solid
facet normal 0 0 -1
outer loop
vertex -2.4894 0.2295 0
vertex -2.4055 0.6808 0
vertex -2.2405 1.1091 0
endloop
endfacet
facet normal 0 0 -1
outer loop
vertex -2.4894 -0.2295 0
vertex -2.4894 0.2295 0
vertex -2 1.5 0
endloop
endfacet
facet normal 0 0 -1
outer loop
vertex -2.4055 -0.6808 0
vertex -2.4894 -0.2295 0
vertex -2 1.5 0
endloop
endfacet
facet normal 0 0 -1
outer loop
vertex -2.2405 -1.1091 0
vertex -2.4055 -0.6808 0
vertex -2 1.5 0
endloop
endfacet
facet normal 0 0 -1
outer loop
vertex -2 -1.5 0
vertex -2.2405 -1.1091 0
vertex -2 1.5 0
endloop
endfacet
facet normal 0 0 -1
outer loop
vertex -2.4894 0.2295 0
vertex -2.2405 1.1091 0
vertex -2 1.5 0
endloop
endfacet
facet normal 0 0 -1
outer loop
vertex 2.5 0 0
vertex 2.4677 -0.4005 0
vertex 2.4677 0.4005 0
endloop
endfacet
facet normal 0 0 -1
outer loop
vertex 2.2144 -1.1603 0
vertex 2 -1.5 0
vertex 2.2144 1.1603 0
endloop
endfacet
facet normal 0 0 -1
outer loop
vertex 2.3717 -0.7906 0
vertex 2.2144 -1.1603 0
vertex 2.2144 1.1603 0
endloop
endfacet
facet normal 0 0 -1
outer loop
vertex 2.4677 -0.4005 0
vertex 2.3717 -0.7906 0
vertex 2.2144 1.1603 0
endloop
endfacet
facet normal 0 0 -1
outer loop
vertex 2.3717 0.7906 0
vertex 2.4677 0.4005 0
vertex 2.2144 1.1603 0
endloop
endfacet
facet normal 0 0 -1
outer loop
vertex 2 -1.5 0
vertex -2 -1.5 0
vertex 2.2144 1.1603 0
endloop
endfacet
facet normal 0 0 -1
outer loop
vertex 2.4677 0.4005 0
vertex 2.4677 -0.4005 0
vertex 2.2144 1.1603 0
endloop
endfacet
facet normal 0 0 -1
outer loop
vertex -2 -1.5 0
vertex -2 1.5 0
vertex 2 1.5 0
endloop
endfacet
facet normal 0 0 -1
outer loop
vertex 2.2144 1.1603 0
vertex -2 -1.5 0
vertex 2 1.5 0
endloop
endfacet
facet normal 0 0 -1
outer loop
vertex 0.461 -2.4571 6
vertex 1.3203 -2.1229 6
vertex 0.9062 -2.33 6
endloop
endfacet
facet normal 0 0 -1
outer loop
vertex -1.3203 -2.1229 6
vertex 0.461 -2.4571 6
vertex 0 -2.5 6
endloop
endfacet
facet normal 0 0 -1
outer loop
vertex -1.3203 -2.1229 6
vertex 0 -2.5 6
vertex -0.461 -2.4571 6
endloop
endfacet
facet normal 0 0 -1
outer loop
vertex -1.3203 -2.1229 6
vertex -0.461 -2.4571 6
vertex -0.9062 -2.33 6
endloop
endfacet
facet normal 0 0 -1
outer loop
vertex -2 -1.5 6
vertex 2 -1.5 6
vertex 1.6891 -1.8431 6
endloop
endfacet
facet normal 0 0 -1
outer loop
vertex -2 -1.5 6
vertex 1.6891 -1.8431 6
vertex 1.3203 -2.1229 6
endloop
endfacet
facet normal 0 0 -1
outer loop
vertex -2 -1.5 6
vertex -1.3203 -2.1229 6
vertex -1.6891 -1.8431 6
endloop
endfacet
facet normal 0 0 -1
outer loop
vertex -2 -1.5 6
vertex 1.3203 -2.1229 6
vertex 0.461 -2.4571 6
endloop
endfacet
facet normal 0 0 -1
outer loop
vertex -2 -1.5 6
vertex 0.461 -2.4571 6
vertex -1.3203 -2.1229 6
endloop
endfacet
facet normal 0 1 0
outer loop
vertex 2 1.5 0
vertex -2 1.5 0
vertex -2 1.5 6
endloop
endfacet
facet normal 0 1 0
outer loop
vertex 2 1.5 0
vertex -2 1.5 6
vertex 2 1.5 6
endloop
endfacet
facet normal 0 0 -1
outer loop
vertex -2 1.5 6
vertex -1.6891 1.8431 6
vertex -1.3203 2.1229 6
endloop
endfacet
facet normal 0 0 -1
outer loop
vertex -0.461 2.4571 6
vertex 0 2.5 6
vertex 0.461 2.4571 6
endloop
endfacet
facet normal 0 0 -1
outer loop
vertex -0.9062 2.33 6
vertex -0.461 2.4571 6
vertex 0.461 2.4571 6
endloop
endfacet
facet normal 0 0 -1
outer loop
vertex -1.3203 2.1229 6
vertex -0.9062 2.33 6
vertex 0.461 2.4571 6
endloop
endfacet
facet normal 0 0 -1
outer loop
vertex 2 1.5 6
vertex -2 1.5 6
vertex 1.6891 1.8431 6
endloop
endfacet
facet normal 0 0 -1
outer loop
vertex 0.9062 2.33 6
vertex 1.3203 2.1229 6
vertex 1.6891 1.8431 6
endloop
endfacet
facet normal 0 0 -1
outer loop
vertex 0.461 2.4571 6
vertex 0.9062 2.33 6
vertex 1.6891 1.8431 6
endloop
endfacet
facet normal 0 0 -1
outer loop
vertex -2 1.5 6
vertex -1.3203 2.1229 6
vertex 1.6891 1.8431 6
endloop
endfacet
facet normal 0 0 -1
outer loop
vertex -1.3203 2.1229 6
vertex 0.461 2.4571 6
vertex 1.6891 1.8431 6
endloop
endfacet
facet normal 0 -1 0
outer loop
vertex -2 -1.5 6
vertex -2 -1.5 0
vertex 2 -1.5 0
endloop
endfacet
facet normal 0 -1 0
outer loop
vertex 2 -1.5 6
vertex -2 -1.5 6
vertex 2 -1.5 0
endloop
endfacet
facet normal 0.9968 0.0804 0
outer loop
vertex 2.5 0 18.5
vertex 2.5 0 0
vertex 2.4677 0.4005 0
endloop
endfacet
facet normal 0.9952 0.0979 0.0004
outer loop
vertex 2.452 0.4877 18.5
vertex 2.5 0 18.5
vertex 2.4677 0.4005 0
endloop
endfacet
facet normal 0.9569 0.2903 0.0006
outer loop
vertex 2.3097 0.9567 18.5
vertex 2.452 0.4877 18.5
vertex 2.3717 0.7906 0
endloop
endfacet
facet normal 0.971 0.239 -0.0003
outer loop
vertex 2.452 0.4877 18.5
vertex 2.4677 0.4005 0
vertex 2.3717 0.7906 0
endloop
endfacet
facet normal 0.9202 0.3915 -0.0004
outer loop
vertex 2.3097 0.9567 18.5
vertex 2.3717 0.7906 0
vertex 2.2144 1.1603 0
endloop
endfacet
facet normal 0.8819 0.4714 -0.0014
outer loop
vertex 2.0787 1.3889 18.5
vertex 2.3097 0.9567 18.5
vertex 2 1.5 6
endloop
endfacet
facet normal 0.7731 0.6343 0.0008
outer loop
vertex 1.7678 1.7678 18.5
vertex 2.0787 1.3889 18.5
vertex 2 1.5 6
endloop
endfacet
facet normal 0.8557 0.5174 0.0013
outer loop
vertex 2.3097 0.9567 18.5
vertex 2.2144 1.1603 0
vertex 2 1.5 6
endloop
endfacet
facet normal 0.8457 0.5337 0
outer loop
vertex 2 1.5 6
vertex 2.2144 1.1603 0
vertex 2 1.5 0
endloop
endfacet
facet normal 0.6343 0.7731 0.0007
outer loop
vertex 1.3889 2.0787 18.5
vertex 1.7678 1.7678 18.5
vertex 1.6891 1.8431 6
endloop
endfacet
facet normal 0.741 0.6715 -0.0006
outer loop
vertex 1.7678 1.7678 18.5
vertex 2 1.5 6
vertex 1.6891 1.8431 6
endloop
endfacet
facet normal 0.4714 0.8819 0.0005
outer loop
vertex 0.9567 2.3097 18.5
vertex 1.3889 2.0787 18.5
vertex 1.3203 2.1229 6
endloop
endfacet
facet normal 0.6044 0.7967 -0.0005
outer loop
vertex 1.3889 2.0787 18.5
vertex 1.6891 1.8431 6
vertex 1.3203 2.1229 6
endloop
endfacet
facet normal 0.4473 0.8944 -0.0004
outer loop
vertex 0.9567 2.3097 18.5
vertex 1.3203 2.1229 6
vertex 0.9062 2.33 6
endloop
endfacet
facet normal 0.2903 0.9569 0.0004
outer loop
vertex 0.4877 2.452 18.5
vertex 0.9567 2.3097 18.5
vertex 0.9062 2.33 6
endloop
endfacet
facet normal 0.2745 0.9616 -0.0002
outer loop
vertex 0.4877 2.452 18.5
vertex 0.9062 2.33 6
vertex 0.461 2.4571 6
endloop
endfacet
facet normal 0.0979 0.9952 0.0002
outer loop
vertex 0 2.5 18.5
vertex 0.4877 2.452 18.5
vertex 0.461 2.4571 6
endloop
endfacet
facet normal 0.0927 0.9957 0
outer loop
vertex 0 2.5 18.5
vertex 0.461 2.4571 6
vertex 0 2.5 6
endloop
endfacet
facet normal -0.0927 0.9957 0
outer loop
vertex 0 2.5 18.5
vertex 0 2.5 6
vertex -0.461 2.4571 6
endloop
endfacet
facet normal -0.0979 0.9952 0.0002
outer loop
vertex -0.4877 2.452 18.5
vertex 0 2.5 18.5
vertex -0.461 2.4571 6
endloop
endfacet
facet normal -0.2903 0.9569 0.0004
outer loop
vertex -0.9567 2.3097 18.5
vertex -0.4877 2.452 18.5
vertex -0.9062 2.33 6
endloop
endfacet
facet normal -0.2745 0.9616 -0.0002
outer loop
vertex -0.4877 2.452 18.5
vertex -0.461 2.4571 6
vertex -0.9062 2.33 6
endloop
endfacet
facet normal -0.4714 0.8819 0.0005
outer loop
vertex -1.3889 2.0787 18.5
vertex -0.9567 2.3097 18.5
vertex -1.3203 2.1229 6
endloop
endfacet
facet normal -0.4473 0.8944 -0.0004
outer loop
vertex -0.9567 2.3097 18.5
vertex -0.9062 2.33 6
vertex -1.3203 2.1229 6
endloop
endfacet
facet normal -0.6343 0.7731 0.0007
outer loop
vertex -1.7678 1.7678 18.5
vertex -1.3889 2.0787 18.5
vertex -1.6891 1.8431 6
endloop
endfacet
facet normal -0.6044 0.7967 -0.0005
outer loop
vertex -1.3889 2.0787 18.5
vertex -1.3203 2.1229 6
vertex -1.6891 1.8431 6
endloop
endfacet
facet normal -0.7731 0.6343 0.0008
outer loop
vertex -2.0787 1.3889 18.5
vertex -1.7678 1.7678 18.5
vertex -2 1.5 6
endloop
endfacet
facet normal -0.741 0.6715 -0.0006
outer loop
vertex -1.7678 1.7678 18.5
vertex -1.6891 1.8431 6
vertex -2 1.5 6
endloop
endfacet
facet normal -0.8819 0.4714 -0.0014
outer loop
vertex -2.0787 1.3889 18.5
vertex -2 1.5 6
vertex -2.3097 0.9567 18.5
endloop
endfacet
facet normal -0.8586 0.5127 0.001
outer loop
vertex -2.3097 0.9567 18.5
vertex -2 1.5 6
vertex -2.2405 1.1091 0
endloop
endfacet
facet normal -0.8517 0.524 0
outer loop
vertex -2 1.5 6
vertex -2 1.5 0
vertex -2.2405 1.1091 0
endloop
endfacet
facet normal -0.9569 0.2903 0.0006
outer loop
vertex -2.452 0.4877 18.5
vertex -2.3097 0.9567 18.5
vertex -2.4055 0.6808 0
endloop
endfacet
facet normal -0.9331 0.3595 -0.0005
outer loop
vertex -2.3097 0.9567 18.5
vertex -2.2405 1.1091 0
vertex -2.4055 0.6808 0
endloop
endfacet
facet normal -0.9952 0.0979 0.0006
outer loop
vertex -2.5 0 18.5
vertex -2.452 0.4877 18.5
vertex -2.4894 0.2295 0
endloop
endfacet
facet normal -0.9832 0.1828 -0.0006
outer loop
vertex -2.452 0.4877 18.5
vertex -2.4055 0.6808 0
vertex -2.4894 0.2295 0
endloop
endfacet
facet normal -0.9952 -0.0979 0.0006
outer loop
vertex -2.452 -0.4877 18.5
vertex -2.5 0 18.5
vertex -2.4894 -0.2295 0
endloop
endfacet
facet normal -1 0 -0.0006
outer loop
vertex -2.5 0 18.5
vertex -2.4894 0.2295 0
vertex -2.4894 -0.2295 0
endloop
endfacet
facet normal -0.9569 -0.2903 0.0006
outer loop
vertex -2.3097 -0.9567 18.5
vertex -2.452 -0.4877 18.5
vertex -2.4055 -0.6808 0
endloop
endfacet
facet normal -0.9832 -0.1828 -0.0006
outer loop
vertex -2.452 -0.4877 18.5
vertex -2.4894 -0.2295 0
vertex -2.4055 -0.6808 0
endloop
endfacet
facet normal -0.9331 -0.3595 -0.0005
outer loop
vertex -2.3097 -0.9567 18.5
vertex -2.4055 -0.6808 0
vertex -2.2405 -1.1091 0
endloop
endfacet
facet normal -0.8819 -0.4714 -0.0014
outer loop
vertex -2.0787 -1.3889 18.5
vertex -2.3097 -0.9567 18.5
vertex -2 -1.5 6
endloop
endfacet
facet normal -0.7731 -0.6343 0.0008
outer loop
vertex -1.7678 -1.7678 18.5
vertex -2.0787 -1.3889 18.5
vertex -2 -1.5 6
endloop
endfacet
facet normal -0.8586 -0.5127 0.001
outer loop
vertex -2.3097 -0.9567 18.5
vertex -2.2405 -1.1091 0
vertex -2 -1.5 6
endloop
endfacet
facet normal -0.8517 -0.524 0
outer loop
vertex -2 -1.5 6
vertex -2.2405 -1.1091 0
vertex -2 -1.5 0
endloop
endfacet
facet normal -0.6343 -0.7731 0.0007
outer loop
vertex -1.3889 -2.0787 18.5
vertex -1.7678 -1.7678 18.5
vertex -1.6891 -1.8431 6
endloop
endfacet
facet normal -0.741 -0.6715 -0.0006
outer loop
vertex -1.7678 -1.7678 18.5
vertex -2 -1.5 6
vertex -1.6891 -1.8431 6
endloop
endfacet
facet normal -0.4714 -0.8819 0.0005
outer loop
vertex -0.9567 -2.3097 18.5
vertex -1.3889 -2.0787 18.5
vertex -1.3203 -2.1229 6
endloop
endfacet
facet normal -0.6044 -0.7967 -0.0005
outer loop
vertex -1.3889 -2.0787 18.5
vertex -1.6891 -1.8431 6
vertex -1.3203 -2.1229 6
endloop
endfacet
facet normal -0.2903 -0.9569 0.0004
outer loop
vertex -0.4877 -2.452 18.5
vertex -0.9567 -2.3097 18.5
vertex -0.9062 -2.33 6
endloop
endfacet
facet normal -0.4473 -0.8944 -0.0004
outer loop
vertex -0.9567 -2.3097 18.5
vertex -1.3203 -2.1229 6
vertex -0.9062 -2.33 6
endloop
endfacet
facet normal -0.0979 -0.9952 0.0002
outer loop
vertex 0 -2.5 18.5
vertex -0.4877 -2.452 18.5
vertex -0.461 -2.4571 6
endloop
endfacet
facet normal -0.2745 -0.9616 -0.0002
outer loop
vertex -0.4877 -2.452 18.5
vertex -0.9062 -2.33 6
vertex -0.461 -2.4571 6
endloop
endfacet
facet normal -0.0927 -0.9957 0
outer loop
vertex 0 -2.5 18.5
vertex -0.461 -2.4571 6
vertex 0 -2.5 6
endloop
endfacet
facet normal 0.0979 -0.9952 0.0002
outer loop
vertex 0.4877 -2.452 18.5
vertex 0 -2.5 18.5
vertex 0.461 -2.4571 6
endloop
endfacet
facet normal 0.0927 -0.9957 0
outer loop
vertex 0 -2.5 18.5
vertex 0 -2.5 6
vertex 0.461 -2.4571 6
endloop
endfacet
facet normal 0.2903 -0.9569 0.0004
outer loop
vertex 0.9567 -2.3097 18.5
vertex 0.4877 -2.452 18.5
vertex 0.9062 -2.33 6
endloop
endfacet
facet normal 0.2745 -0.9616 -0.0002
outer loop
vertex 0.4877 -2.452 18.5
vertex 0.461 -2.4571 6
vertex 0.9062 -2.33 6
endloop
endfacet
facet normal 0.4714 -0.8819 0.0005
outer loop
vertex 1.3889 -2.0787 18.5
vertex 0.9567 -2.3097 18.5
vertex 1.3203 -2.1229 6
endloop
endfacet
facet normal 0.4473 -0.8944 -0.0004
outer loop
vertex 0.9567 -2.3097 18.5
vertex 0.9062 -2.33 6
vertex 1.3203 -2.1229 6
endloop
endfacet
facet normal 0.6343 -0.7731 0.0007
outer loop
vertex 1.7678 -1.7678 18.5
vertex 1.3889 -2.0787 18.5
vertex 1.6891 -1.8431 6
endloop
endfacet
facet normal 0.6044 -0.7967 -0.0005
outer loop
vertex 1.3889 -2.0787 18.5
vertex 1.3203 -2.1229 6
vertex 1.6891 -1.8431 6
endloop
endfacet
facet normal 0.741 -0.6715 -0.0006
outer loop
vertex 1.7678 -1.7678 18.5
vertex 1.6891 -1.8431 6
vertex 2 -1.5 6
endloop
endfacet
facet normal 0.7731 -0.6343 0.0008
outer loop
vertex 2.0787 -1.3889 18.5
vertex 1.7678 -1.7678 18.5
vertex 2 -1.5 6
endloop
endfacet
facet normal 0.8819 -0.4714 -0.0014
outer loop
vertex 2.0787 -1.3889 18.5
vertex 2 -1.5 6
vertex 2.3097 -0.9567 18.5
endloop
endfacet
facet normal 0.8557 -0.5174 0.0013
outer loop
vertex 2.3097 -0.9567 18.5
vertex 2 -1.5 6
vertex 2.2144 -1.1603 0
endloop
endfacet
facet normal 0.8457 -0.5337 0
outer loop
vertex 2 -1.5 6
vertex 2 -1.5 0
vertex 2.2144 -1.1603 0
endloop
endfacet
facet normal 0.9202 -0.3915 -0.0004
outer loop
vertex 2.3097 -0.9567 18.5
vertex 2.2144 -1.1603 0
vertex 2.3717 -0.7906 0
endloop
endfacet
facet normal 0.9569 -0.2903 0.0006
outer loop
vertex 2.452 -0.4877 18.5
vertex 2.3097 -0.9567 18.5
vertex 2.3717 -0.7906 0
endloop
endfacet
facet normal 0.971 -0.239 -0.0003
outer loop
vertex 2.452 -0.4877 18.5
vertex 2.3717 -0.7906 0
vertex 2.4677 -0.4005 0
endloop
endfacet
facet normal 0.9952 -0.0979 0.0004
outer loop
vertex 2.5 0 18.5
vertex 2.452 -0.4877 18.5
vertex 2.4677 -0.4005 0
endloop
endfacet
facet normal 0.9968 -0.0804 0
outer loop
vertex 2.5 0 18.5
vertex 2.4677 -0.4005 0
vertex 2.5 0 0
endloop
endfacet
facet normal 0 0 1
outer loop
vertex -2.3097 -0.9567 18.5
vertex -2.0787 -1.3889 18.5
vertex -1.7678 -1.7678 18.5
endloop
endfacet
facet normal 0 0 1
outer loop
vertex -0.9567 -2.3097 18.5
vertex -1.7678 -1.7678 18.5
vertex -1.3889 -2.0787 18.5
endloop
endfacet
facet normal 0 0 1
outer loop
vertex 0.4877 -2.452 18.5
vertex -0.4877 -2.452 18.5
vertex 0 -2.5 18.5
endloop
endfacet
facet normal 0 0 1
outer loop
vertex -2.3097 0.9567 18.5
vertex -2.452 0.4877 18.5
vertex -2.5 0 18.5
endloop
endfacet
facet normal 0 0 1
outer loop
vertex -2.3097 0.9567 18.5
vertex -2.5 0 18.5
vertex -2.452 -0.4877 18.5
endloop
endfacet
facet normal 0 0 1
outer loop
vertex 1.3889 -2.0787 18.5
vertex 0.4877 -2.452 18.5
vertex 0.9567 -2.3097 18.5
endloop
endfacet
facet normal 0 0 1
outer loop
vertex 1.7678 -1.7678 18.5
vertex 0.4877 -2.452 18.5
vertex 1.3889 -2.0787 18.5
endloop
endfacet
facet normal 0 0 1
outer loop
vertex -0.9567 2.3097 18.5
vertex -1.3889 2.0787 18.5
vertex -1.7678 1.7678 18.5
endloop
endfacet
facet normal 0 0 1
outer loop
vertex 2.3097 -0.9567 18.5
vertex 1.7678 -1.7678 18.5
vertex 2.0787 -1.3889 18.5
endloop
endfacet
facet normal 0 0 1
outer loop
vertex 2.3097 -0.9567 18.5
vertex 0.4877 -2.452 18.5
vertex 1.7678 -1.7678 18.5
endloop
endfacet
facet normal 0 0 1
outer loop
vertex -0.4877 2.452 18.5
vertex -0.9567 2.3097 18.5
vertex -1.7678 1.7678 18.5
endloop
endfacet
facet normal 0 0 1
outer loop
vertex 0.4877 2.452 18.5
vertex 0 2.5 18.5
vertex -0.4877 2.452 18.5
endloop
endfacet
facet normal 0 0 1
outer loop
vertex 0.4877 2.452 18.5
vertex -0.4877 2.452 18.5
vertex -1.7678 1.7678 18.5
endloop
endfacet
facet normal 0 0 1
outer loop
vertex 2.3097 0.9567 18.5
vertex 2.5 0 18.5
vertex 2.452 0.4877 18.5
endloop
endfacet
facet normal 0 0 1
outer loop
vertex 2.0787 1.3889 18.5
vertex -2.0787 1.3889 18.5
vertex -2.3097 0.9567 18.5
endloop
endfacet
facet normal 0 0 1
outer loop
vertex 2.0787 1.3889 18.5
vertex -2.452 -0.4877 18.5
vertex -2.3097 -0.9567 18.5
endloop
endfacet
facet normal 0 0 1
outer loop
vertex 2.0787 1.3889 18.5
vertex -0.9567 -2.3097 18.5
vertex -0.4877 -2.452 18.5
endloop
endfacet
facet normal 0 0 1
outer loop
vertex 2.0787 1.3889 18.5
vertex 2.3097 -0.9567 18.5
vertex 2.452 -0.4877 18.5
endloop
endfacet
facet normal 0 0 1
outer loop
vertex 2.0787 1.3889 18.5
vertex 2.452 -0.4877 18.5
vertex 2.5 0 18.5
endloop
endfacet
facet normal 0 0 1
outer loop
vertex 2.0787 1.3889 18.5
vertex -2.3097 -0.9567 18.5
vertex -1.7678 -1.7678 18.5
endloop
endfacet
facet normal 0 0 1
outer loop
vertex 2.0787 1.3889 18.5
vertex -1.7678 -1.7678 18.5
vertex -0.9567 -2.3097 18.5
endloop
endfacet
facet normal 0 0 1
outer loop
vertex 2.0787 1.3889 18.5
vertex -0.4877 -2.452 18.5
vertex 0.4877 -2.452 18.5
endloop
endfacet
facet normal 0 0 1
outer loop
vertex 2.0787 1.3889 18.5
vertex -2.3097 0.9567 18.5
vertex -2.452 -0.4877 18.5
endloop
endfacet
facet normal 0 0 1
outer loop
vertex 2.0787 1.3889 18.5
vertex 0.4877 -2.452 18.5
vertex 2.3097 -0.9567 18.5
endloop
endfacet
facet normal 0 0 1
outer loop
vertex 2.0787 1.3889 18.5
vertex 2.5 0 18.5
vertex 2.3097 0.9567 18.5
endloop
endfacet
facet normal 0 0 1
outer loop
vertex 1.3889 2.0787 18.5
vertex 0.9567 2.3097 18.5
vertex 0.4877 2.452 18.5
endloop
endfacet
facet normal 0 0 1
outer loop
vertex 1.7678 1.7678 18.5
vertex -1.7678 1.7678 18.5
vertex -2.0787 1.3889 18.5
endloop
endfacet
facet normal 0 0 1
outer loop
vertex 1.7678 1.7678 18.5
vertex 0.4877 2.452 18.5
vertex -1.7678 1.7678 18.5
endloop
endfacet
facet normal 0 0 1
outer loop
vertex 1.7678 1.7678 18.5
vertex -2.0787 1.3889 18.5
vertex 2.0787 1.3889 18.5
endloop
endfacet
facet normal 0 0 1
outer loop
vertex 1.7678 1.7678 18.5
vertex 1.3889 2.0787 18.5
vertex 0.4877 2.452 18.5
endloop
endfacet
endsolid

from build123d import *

# Parameters (mm, degrees)
ESQUISSE1_R             = 2.5
BOSS_EXTRU_1_DEPTH      = 18.5
ENL_V_MAT_EXTRU_1_DEPTH = 6


with BuildPart() as part:
    # Esquisse1 → Boss.-Extru.1 (new body)
    with BuildSketch(Plane.XY):
        Circle(ESQUISSE1_R)
    extrude(amount=BOSS_EXTRU_1_DEPTH)

    # Esquisse2 → Enlèv. mat.-Extru.1 (cut)
    with BuildSketch(Plane.XY):
        with BuildLine():
            Line((-2, 1.5), (2, 1.5))
            ThreePointArc((2, 1.5), (0, 2.5), (-2, 1.5))
        make_face()
        with BuildLine():
            Line((-2, -1.5), (2, -1.5))
            ThreePointArc((2, -1.5), (0, -2.5), (-2, -1.5))
        make_face()
    extrude(amount=ENL_V_MAT_EXTRU_1_DEPTH, mode=Mode.SUBTRACT)


solid = part.part
